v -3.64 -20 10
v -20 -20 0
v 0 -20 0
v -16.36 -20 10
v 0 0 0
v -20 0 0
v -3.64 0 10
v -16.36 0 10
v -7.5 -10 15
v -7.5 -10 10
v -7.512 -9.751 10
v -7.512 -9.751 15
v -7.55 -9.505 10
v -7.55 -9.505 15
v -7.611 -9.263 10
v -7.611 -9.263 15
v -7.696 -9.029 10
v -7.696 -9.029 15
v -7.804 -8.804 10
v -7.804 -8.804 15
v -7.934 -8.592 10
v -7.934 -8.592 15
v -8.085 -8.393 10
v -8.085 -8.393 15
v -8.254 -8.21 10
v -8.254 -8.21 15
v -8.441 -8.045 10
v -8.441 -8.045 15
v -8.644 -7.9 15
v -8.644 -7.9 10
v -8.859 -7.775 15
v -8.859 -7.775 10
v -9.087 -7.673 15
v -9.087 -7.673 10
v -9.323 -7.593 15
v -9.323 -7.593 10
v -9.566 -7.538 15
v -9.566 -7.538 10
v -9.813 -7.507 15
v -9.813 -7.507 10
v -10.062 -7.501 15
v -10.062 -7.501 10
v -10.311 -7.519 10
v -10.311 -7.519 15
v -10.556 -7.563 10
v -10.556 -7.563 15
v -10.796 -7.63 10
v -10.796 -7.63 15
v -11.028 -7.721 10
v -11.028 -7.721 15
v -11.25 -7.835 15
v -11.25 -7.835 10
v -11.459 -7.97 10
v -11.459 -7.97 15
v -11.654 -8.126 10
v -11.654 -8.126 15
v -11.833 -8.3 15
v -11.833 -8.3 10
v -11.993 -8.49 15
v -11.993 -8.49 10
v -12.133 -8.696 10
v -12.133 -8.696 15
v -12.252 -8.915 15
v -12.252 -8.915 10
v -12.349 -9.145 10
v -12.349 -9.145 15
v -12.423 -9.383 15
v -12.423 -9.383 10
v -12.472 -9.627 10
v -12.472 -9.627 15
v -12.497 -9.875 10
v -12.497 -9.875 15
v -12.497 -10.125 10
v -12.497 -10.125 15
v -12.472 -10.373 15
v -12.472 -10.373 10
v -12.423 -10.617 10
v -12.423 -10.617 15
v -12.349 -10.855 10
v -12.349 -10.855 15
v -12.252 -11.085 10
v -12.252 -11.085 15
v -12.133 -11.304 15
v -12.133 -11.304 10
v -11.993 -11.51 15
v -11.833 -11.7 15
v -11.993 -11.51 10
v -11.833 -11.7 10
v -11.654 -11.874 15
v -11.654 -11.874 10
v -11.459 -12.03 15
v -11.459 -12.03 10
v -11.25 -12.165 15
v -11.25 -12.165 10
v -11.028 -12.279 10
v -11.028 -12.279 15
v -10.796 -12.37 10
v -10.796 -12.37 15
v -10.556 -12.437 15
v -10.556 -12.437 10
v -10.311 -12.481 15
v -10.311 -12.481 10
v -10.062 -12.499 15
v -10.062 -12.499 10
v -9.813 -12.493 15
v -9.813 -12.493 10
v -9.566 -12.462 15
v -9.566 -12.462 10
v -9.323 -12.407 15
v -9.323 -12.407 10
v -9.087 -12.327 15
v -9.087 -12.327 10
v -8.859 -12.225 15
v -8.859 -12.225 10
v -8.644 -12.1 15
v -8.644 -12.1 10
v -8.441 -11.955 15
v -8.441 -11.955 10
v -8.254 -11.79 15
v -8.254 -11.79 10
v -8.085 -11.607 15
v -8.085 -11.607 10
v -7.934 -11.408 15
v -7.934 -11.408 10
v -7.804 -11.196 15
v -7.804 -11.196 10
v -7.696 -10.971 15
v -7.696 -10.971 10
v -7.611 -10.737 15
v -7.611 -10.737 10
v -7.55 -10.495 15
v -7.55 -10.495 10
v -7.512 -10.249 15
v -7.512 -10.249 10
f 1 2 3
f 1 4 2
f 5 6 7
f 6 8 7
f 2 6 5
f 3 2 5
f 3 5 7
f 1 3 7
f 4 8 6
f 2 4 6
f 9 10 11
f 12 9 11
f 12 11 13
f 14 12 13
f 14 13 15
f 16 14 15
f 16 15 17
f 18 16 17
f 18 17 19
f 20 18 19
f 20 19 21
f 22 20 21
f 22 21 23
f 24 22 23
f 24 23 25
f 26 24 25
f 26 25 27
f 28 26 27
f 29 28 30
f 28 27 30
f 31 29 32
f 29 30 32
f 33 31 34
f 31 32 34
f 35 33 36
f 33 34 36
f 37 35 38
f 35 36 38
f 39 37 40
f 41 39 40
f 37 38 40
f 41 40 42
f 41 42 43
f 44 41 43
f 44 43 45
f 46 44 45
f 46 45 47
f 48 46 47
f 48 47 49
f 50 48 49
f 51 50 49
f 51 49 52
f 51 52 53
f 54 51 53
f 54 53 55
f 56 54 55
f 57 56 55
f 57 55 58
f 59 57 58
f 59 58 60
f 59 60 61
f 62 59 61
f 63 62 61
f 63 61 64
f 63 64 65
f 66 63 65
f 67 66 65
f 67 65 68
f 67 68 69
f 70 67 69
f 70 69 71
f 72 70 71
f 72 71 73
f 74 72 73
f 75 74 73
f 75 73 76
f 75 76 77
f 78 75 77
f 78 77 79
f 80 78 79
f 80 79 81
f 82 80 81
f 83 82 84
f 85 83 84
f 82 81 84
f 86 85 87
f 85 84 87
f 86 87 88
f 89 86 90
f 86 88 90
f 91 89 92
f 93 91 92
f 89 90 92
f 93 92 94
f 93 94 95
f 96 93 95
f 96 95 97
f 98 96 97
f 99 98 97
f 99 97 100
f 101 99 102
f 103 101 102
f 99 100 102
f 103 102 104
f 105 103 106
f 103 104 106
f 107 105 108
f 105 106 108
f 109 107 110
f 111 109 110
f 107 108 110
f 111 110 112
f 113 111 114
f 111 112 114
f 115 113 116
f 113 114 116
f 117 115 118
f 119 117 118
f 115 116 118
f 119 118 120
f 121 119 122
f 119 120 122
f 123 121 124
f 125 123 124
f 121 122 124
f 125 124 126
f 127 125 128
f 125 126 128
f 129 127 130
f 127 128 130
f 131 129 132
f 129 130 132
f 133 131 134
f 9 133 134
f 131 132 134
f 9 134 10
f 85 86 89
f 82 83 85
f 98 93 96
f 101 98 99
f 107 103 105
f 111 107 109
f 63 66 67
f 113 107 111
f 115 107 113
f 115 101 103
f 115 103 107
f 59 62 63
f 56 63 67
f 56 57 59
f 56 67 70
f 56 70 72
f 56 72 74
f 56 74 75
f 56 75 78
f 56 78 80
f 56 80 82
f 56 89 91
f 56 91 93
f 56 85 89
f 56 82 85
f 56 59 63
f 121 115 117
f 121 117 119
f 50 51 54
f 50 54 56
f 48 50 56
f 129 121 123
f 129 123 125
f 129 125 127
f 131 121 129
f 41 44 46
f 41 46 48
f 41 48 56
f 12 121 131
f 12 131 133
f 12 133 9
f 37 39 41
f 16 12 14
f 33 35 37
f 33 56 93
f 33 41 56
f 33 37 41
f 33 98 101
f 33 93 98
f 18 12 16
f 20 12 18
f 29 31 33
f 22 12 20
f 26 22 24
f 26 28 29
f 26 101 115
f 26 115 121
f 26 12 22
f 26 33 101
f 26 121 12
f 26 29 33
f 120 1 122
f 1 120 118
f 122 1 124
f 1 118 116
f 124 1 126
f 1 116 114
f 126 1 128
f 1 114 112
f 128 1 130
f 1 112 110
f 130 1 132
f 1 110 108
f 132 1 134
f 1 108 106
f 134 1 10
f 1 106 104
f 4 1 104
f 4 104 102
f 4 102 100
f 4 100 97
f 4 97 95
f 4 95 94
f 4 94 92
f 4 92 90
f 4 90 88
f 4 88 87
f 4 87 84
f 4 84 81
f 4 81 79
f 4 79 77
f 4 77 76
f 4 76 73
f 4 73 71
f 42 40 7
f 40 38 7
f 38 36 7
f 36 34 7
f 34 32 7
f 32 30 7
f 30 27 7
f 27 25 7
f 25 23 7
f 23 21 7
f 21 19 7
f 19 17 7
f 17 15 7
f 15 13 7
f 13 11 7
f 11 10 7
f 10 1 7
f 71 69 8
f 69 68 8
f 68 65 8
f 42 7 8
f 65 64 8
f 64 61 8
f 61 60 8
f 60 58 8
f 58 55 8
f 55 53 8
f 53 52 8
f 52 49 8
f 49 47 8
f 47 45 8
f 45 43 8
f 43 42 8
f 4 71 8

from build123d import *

# Parameters (mm, degrees)
F1_DEPTH = 20
F2_R     = 2.5
F3_DEPTH = 15


with BuildPart() as f1:
    # F0 (on Front) → F1 (new body)
    with BuildSketch(Plane.XZ):
        Polygon((-20, 0), (0, 0), (-3.64, 10), (-16.36, 10), align=None)
    extrude(amount=F1_DEPTH)

    # F2 (on Top) → F3 (join)
    with BuildSketch(Plane.XY):
        with Locations((-10, -10)):
            Circle(F2_R)
    extrude(amount=F3_DEPTH)


solid = f1.part
